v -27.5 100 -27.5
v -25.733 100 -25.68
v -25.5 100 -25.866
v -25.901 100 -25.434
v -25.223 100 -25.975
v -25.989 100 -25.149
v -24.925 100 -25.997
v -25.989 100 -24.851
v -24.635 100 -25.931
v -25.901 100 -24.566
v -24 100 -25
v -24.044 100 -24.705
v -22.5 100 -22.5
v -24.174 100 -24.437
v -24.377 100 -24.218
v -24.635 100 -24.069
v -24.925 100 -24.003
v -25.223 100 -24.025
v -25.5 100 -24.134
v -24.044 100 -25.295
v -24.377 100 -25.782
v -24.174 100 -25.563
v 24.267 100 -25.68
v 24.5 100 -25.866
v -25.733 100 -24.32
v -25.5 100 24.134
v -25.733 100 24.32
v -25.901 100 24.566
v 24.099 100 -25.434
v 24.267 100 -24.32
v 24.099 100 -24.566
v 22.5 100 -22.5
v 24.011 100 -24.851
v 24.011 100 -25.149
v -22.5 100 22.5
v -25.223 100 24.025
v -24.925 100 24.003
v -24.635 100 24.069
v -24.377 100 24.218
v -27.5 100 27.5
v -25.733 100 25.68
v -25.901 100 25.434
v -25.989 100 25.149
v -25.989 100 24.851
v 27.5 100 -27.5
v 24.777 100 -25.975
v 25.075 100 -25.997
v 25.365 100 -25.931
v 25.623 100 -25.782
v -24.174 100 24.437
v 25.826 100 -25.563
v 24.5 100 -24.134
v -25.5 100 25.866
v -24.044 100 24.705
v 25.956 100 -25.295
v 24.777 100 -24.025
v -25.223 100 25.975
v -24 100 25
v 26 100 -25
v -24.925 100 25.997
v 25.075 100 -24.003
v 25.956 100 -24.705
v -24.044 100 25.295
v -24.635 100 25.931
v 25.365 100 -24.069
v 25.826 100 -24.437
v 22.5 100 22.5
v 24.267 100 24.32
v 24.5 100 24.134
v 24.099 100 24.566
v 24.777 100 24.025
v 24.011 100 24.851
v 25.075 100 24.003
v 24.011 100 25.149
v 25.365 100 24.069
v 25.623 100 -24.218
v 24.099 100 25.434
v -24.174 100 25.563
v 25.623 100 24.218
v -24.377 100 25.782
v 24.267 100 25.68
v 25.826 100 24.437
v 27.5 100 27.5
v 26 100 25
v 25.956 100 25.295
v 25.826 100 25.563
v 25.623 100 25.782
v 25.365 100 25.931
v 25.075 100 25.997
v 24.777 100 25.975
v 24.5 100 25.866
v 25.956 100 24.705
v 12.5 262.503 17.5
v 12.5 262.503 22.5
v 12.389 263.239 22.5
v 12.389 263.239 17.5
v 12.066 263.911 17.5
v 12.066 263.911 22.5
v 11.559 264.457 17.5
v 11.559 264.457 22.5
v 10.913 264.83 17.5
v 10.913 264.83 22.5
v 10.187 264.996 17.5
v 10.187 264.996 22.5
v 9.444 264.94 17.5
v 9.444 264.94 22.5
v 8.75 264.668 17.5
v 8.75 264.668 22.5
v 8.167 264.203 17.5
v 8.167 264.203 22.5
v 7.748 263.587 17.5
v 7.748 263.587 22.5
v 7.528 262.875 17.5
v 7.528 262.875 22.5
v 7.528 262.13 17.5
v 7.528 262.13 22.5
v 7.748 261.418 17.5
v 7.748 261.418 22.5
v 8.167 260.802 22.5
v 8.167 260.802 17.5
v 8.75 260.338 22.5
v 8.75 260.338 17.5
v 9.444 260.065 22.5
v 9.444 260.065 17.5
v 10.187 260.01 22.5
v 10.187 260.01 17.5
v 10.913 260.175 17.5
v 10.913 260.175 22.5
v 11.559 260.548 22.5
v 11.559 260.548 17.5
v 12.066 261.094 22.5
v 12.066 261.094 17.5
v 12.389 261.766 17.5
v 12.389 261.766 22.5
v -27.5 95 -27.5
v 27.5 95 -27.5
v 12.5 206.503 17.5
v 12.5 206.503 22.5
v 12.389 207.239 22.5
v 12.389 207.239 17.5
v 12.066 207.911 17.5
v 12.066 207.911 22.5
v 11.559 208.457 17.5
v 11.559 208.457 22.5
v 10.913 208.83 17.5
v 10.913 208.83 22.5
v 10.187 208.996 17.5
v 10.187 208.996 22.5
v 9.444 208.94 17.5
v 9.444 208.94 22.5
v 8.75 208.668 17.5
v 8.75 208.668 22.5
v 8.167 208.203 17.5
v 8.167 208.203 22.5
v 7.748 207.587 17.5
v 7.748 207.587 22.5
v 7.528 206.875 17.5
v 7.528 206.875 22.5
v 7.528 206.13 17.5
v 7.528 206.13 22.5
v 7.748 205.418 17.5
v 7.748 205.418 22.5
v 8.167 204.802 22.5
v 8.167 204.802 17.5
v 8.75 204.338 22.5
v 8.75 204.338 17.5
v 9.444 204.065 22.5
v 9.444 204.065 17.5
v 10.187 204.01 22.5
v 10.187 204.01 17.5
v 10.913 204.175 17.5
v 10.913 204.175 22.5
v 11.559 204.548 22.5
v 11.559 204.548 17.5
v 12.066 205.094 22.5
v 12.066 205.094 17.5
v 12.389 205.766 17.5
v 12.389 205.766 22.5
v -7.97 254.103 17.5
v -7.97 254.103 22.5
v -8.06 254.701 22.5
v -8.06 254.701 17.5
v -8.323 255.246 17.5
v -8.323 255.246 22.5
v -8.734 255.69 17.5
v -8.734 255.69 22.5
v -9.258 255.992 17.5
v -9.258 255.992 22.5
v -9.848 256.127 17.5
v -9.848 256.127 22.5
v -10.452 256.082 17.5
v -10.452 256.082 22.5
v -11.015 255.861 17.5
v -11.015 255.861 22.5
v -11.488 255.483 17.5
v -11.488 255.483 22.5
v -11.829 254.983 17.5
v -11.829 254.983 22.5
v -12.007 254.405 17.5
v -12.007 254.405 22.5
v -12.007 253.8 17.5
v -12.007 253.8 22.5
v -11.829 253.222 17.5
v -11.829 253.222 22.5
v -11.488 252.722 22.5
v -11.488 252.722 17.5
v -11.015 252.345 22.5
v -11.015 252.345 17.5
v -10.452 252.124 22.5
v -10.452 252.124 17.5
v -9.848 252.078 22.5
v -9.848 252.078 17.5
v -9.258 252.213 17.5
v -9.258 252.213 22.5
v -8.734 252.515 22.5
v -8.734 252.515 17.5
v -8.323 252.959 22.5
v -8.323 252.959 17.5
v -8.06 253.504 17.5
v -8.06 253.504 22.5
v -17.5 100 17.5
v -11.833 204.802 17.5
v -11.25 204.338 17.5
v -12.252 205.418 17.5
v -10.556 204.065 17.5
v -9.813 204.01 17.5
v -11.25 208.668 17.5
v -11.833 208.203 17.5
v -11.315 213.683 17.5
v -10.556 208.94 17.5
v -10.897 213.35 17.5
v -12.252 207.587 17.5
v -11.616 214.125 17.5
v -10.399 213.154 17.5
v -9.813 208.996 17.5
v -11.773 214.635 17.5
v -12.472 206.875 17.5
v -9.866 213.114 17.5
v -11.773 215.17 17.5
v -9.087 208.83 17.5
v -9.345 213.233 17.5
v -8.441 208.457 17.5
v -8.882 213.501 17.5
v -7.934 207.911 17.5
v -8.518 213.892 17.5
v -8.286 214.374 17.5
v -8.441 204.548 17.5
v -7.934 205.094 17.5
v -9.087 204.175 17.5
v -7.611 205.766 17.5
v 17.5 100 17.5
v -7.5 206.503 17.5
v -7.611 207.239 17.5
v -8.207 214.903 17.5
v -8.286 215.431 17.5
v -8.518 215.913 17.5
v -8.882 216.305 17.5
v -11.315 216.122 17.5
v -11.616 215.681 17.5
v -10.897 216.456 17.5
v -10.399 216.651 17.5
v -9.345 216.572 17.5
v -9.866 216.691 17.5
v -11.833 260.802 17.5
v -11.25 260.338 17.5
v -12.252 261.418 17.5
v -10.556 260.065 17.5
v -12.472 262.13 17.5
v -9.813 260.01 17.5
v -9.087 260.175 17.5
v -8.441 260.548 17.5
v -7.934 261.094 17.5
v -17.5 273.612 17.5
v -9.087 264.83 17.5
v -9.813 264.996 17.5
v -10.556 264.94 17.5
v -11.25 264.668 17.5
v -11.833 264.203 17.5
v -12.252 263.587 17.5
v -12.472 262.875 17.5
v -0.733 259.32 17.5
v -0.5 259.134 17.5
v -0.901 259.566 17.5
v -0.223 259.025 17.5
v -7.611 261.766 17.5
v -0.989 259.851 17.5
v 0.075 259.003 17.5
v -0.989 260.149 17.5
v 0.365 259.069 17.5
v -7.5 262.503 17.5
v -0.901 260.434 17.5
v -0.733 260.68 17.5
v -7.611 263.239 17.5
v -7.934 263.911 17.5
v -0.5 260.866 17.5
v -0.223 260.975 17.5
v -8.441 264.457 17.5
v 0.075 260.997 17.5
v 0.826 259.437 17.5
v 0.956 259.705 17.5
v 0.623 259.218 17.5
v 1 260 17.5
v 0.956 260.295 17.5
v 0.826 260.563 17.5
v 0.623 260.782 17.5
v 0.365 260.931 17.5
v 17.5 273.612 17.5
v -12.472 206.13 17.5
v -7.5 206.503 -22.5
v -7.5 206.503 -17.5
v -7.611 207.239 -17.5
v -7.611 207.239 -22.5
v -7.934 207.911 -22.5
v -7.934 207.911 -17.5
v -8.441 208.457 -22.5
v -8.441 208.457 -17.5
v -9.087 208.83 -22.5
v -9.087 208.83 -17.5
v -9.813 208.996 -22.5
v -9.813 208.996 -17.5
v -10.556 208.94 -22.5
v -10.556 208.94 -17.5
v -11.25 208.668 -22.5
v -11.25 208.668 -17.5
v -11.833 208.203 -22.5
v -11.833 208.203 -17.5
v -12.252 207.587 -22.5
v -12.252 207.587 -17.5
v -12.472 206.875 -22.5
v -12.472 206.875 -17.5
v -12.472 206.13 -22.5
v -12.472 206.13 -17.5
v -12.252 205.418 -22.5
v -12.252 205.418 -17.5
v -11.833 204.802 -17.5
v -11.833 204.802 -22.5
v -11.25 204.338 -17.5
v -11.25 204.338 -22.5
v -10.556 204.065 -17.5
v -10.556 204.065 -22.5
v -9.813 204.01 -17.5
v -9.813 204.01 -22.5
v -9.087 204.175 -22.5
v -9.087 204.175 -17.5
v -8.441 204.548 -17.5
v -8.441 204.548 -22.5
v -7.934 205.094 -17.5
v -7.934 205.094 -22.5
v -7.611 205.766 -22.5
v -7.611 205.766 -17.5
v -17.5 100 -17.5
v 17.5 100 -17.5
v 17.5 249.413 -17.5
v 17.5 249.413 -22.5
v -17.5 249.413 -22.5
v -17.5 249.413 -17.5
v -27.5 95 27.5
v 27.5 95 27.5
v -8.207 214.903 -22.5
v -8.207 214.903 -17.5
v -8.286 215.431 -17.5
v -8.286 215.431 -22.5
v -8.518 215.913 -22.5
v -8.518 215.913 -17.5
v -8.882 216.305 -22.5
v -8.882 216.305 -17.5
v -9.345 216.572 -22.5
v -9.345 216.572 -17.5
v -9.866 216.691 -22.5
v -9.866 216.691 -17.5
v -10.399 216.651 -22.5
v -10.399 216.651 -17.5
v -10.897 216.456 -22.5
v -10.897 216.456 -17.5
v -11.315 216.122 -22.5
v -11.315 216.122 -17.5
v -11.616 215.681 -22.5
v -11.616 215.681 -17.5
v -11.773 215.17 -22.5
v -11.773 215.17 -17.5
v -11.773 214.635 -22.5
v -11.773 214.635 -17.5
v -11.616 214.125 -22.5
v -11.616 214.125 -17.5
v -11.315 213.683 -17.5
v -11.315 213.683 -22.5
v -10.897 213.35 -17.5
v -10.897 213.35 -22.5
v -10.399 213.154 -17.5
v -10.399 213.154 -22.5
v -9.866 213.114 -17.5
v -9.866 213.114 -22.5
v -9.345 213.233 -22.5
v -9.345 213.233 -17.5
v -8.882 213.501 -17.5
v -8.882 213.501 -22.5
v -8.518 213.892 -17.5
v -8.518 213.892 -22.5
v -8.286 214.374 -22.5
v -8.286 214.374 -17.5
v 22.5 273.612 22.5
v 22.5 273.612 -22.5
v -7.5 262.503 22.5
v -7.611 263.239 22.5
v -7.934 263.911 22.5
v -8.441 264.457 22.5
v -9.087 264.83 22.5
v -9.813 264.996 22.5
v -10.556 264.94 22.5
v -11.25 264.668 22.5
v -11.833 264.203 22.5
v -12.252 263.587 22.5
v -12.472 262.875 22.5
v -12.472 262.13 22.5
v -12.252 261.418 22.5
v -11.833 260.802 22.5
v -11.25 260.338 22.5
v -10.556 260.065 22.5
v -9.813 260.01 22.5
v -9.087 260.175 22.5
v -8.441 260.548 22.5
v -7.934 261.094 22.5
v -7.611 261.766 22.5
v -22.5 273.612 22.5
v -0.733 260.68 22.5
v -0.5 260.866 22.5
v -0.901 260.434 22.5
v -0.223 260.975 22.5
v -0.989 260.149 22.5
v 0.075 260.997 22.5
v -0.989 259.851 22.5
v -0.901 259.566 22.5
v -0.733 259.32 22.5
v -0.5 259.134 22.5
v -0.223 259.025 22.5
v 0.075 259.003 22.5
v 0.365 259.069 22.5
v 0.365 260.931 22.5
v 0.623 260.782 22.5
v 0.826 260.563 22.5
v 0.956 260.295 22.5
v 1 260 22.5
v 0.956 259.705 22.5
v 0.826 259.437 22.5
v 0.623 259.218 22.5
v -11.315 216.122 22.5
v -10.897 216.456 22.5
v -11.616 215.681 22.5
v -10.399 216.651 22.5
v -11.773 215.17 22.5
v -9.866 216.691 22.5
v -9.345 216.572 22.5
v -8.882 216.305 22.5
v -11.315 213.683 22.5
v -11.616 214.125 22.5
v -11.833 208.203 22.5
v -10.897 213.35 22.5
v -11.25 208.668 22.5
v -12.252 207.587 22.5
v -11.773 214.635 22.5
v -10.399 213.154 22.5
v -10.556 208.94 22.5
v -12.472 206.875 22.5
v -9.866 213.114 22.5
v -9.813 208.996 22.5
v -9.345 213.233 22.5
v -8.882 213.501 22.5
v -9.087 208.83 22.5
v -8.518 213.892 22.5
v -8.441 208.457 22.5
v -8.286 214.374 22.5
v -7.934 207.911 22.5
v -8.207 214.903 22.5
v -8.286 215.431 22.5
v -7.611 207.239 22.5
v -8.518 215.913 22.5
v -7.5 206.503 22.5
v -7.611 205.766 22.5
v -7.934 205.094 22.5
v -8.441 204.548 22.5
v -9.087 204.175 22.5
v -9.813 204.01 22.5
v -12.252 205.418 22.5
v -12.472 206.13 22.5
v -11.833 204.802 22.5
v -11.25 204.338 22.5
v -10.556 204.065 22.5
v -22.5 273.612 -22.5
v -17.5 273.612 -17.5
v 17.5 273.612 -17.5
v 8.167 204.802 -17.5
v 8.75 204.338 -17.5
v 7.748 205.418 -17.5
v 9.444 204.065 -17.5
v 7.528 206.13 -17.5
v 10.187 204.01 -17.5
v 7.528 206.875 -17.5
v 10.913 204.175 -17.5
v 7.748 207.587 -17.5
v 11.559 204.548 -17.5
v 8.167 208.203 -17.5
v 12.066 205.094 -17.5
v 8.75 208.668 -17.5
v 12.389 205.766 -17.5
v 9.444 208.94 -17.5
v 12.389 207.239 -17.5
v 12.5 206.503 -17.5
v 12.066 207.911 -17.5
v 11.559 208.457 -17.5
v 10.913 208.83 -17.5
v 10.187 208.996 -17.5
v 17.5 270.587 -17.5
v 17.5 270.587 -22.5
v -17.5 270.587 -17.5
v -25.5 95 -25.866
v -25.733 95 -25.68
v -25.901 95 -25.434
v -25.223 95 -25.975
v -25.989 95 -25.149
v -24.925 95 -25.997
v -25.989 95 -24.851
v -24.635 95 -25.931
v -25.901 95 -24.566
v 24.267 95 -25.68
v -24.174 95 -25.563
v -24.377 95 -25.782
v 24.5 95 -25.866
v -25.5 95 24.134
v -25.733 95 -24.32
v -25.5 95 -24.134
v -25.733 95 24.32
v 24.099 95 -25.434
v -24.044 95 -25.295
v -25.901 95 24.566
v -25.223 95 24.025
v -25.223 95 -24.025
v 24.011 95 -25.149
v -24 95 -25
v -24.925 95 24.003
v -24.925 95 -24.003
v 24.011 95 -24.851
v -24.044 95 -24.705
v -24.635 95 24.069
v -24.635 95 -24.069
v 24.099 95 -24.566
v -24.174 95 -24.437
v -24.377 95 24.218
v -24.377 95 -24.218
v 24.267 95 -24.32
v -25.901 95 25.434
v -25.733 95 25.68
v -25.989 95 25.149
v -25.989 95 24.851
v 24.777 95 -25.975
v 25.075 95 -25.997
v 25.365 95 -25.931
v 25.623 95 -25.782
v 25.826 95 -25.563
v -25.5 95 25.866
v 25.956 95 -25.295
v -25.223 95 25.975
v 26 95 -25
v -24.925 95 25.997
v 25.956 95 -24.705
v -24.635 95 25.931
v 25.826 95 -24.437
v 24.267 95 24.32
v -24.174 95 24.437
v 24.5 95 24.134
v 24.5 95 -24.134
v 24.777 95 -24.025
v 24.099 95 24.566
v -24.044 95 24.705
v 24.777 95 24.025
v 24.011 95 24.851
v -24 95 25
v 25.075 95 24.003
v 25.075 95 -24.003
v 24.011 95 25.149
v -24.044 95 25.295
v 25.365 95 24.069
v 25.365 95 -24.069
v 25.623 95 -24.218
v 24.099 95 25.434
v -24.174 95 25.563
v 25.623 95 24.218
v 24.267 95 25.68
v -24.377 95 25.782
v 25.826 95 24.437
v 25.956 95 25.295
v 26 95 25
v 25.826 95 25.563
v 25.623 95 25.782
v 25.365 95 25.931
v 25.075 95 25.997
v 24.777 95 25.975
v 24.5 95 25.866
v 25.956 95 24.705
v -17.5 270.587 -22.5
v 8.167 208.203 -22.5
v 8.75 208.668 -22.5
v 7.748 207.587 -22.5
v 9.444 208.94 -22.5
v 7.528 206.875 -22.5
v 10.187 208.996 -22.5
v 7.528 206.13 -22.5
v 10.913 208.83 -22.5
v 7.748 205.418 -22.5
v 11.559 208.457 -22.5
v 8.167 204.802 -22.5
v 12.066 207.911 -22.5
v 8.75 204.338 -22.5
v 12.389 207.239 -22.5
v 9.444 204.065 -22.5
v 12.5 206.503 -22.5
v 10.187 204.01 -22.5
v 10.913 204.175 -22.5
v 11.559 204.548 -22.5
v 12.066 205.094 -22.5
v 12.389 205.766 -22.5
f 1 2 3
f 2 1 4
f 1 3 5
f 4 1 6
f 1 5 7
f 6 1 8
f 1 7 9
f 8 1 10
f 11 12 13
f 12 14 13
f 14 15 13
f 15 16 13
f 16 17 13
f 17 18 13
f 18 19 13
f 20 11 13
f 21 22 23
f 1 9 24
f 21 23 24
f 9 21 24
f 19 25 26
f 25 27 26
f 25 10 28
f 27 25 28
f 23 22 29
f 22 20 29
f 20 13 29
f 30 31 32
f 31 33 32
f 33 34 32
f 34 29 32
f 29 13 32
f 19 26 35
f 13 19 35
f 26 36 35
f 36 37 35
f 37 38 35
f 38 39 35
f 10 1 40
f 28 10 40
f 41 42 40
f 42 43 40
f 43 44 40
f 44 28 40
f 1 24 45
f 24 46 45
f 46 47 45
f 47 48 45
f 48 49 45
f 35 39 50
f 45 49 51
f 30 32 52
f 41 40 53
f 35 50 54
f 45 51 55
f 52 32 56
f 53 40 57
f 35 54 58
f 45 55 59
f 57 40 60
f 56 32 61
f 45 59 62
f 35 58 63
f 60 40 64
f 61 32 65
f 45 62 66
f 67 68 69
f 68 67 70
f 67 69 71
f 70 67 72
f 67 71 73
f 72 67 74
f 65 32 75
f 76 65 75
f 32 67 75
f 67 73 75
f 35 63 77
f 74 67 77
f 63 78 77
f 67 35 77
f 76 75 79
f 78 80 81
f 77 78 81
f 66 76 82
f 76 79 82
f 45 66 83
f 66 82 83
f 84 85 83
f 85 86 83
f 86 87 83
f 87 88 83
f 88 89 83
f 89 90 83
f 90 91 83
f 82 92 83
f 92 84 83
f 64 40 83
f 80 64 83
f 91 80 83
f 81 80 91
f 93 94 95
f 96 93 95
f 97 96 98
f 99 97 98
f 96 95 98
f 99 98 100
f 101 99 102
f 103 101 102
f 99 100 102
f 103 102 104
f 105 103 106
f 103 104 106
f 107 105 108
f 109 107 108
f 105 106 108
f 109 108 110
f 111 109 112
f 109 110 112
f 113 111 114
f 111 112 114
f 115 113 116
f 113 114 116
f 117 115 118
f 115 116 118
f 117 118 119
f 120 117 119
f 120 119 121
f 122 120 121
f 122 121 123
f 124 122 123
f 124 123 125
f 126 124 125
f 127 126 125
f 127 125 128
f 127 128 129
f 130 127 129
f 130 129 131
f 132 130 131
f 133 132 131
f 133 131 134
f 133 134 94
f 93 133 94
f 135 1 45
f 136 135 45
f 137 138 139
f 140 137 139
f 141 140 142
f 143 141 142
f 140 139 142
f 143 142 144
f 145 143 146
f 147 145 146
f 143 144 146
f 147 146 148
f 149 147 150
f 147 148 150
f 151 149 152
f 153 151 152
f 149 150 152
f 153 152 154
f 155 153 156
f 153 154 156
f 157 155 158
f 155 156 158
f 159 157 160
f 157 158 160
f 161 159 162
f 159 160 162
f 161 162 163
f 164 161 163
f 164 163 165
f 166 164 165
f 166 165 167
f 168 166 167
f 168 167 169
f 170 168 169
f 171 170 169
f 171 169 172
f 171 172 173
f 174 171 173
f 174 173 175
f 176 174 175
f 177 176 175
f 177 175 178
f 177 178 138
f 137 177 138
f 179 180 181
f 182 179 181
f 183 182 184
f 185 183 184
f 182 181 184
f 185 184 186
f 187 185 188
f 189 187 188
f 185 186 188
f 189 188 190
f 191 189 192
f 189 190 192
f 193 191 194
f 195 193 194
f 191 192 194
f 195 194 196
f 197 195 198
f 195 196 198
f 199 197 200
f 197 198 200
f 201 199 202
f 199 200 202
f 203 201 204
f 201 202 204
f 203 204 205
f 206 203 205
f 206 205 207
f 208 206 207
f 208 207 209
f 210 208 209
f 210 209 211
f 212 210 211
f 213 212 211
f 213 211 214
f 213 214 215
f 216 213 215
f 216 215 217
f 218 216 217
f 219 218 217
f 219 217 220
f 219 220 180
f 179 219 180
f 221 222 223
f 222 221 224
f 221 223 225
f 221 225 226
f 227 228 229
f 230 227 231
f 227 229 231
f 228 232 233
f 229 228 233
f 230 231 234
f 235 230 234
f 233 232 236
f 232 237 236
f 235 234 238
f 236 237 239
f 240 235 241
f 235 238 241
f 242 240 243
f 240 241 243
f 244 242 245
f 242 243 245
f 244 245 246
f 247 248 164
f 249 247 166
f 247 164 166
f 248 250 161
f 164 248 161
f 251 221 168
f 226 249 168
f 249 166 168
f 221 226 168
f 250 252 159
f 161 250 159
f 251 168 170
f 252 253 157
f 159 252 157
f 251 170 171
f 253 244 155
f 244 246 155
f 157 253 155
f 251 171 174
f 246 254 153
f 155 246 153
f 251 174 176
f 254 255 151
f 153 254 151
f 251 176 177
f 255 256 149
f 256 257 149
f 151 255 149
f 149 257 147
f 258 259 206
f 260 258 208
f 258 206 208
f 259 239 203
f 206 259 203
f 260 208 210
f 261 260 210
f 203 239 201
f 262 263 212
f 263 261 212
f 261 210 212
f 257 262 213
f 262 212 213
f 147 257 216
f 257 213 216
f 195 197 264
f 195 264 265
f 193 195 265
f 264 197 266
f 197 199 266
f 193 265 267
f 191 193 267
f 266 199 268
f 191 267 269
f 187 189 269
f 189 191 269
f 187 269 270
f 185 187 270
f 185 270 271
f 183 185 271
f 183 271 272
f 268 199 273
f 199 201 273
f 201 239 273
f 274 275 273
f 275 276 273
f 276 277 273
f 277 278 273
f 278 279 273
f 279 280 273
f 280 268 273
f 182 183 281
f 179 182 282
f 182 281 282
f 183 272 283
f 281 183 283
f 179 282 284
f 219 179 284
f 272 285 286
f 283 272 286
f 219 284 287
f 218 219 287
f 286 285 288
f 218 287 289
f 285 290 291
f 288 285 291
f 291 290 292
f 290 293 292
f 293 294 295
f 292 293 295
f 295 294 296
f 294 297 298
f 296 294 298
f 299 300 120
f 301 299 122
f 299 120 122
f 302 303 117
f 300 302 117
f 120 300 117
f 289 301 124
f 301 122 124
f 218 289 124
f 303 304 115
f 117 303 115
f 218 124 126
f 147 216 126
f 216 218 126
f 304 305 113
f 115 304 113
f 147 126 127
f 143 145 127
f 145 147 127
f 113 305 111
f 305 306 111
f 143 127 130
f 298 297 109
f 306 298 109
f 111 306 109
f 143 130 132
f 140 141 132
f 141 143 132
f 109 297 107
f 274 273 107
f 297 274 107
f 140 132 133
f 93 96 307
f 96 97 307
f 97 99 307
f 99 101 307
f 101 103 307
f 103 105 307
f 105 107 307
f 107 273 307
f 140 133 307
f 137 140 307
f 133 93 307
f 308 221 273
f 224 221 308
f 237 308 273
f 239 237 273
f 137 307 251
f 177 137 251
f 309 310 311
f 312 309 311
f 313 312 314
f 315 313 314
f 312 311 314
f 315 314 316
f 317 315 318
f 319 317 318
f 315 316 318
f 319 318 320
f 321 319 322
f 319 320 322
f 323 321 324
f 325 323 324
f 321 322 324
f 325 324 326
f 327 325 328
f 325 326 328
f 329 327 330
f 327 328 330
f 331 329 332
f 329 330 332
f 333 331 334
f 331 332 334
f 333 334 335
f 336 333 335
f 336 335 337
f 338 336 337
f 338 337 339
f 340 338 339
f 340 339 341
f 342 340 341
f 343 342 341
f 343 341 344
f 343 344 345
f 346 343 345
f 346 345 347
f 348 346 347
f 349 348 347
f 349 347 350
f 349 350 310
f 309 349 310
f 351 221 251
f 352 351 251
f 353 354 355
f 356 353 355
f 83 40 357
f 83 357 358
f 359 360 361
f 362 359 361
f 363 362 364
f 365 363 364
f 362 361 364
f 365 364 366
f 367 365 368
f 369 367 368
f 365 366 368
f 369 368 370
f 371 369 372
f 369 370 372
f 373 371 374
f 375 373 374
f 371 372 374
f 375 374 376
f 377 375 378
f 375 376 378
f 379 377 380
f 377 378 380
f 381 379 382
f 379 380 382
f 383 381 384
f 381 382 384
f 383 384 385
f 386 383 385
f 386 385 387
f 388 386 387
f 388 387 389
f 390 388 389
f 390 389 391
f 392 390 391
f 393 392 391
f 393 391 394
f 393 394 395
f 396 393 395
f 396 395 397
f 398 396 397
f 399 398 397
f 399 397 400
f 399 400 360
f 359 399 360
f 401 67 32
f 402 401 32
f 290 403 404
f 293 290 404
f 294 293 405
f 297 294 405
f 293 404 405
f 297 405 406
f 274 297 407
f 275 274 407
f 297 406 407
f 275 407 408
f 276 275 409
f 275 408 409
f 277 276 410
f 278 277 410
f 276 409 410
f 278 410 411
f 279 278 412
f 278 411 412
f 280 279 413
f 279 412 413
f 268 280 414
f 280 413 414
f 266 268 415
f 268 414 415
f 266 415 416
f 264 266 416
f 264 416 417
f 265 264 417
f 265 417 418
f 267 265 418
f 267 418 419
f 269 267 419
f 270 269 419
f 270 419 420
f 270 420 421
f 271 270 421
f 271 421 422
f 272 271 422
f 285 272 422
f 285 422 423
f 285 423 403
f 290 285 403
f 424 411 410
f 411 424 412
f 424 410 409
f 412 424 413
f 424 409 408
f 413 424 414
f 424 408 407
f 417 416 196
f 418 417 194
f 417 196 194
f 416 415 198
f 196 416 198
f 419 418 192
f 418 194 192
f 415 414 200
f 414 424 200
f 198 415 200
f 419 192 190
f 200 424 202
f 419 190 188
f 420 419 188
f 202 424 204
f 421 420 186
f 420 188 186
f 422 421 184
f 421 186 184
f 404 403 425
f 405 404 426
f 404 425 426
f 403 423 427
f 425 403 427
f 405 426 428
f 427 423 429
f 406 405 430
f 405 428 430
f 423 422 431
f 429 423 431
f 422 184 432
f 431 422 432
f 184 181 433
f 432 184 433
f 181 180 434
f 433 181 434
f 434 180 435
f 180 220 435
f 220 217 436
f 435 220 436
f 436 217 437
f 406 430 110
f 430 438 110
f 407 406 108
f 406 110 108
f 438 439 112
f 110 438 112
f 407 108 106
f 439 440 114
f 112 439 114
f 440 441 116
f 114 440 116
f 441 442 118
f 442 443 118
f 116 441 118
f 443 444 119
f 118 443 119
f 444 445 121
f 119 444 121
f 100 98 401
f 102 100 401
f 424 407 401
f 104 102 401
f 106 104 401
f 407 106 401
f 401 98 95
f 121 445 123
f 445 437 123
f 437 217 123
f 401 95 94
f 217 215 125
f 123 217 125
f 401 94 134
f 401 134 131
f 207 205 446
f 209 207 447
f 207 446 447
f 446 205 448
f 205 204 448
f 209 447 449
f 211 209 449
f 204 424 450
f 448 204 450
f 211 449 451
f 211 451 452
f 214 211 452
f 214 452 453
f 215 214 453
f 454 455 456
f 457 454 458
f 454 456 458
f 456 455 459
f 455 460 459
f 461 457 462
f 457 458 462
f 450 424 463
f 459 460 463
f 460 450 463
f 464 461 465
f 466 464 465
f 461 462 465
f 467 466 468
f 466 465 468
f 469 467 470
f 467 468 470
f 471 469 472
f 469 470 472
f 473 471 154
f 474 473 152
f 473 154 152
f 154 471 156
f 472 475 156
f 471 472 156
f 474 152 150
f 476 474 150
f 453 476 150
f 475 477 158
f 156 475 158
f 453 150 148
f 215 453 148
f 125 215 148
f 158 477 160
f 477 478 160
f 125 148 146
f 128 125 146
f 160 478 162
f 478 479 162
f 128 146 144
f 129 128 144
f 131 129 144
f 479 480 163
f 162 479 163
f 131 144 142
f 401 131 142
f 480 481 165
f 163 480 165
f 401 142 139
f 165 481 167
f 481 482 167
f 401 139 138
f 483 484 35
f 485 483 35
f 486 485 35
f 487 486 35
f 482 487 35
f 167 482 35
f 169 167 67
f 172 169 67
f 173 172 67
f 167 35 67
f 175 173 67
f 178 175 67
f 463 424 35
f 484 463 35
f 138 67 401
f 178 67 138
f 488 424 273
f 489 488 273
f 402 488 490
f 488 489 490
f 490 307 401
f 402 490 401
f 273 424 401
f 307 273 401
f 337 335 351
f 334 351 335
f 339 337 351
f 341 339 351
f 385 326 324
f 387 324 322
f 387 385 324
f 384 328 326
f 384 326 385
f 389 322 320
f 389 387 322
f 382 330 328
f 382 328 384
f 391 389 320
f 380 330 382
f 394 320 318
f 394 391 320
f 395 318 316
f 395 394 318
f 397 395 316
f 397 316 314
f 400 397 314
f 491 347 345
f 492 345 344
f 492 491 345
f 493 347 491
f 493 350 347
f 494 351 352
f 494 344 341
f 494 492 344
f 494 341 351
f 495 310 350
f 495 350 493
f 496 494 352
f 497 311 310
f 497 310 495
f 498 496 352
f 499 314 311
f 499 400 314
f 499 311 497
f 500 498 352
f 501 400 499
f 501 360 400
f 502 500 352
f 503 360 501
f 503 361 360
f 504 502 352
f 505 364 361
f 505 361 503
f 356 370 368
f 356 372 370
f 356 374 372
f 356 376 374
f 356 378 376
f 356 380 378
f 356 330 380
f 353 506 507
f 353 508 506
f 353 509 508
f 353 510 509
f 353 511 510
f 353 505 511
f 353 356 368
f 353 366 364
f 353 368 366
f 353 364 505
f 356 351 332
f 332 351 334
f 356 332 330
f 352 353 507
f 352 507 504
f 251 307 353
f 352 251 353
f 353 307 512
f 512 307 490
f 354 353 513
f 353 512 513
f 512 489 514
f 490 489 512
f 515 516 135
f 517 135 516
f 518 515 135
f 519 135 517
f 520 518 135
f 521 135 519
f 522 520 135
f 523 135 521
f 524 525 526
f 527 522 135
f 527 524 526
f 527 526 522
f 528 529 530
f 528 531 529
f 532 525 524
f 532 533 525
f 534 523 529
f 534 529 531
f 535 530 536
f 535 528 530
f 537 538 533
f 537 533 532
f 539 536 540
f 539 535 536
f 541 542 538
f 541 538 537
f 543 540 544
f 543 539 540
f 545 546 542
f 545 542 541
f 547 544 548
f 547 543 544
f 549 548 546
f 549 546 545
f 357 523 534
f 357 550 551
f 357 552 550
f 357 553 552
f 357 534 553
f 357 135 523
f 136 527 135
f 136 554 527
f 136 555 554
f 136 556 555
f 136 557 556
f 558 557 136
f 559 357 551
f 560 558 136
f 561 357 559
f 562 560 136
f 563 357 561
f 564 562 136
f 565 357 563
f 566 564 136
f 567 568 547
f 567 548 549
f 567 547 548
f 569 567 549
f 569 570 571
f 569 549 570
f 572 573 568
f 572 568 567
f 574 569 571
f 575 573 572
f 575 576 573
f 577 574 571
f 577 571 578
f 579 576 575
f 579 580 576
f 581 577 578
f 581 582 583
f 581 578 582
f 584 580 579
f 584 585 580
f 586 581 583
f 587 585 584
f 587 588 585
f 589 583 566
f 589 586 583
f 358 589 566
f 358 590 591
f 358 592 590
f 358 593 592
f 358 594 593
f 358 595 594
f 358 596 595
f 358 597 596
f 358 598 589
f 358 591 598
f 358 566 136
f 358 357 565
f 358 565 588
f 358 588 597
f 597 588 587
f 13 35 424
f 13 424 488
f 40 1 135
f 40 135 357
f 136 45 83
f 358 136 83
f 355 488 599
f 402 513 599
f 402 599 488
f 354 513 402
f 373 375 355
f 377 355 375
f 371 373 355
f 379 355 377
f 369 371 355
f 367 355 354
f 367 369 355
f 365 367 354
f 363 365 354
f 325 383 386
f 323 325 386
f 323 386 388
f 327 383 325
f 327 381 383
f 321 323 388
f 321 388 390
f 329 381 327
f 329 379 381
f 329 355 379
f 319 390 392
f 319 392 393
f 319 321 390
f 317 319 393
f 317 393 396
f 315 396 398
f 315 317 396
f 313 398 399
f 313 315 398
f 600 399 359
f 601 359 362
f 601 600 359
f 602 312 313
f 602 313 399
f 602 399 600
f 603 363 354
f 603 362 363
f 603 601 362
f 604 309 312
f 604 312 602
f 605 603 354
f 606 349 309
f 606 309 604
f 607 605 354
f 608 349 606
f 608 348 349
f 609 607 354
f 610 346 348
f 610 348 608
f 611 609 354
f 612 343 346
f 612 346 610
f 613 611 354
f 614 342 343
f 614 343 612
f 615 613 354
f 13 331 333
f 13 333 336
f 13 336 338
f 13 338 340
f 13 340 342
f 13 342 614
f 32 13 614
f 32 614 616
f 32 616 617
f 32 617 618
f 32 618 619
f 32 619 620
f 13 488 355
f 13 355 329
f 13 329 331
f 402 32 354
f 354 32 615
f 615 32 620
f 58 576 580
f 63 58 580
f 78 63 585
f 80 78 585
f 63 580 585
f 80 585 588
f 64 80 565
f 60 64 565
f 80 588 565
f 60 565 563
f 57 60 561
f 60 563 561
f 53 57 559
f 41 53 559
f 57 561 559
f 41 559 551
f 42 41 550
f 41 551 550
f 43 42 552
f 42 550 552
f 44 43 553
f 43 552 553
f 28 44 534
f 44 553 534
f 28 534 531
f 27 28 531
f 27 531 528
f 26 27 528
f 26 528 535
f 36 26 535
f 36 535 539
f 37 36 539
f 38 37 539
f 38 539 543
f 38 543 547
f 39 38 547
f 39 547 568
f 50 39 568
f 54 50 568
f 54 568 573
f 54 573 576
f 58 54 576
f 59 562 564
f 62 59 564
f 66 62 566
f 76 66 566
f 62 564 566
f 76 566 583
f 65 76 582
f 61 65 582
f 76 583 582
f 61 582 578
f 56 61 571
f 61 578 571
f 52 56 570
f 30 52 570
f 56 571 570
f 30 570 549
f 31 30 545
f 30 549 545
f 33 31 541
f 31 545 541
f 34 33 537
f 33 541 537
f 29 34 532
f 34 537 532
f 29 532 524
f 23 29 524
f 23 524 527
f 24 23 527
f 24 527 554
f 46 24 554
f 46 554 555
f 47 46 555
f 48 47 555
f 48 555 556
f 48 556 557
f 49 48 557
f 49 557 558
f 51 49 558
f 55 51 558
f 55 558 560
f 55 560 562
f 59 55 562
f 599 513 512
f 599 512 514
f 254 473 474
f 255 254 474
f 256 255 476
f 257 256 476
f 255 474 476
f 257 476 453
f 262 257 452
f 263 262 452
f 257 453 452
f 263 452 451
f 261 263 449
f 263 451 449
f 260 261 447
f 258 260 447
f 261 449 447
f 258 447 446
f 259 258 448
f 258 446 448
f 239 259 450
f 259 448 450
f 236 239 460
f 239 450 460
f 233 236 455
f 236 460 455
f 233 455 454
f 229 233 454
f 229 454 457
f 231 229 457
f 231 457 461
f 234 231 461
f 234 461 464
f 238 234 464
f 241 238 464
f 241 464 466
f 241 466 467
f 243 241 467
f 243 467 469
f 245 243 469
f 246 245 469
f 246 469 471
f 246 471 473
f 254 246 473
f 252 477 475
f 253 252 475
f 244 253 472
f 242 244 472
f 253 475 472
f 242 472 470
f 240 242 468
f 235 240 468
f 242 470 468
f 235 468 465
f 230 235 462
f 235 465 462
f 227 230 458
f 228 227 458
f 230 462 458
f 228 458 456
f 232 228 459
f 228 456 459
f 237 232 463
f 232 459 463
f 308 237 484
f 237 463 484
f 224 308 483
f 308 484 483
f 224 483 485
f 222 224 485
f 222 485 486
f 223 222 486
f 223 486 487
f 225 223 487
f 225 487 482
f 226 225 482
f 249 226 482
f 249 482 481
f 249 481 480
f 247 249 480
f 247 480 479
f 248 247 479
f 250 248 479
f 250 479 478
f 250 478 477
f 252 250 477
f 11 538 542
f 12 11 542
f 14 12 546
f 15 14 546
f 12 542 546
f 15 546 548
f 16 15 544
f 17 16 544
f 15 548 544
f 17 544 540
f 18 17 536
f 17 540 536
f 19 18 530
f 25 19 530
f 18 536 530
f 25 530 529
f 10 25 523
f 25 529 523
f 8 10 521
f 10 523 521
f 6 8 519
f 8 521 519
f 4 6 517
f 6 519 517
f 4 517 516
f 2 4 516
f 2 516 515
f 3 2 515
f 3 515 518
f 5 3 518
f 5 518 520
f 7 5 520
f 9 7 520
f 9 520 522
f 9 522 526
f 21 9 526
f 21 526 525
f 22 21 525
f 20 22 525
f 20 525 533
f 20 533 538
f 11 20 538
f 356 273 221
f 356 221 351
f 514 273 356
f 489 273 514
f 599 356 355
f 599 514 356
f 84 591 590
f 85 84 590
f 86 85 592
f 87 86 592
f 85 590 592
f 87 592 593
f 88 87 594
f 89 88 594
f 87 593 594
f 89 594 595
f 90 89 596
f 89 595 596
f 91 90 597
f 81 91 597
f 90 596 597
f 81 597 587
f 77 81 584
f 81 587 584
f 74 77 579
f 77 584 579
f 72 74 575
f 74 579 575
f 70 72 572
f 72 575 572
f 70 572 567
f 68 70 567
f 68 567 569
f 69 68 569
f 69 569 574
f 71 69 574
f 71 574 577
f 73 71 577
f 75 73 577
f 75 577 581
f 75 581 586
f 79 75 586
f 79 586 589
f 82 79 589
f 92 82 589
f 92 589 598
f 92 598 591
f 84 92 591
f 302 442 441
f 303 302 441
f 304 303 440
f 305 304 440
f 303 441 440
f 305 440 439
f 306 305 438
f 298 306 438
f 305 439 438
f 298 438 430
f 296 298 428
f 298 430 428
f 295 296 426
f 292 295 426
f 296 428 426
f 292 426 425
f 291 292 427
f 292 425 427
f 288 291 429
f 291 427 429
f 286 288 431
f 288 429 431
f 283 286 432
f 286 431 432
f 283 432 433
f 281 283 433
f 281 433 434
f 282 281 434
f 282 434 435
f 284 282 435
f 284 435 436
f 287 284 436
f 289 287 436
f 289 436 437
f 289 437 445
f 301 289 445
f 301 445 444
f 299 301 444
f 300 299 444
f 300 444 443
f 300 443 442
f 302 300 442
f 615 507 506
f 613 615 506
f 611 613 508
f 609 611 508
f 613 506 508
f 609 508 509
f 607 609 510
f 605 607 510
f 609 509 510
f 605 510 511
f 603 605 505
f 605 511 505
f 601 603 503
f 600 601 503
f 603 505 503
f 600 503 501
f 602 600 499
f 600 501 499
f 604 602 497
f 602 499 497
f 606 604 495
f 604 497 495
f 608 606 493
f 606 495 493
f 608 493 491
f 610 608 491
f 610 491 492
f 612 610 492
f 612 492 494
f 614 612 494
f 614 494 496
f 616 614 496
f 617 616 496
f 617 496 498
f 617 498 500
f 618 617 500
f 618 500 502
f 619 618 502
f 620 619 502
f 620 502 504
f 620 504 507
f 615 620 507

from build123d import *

# Parameters (mm, degrees)
CROQUIS1_W                 = 45
CROQUIS1_H                 = 45
SALIENTE_EXTRUIR1_DEPTH    = 300
CROQUIS4_W                 = 18
CROQUIS4_H                 = 34
CORTAR_EXTRUIR2_DEPTH      = 46
CROQUIS8_W                 = 35
CROQUIS8_H                 = 35
CORTAR_EXTRUIR3_DEPTH      = 301
CROQUIS9_W                 = 35
CROQUIS9_H                 = 21.174410022
CORTAR_EXTRUIR4_DEPTH      = 10
CROQUIS10_R                = 1
CORTAR_EXTRUIR5_DEPTH      = 10
CROQUIS11_W                = 45
CROQUIS11_H                = 26.387879272
CORTAR_EXTRUIR6_DEPTH      = 46
CROQUIS13_W                = 45
CROQUIS13_H                = 100
CORTAR_EXTRUIR7_DEPTH      = 23.5
CORTAR_EXTRUIR7_DEPTH_BACK = 23.5
CROQUIS14_W                = 55
CROQUIS14_H                = 55
SALIENTE_EXTRUIR2_DEPTH    = 5
CROQUIS16_R                = 1
CORTAR_EXTRUIR8_DEPTH      = 1
CORTAR_EXTRUIR8_DEPTH_BACK = 179.612120728
CROQUIS17_R                = 2.5
CROQUIS17_R_2              = 2.03
CROQUIS17_R_3              = 1.793308219
CORTAR_EXTRUIR9_DEPTH      = 6
CORTAR_EXTRUIR9_DEPTH_BACK = 51


with BuildPart() as part:
    # Croquis1 → Saliente-Extruir1 (new body)
    with BuildSketch(Plane(origin=(0, 0, 0), x_dir=(1, 0, 0), z_dir=(0, 1, 0))):
        Rectangle(CROQUIS1_W, CROQUIS1_H)
    extrude(amount=SALIENTE_EXTRUIR1_DEPTH)

    # Croquis4 → Cortar-Extruir2 (cut, through all)
    with BuildSketch(Plane.ZY.offset(22.5)):
        with Locations((13.5, 17)):
            Rectangle(CROQUIS4_W, CROQUIS4_H)
    extrude(amount=-CORTAR_EXTRUIR2_DEPTH, mode=Mode.SUBTRACT)

    # Croquis8 → Cortar-Extruir3 (cut, through all)
    with BuildSketch(Plane(origin=(0, 300, 0), x_dir=(1, 0, 0), z_dir=(0, 1, 0))):
        Rectangle(CROQUIS8_W, CROQUIS8_H)
    extrude(amount=-CORTAR_EXTRUIR3_DEPTH, mode=Mode.SUBTRACT)

    # Croquis9 → Cortar-Extruir4 (cut)
    with BuildSketch(Plane(origin=(0, 0, -22.5), x_dir=(-1, 0, 0), z_dir=(0, 0, -1))):
        with Locations((0, 260)):
            Rectangle(CROQUIS9_W, CROQUIS9_H)
    extrude(amount=-CORTAR_EXTRUIR4_DEPTH, mode=Mode.SUBTRACT)

    # Croquis10 → Cortar-Extruir5 (cut)
    with BuildSketch(Plane.XY.offset(22.5)):
        with Locations((0, 260)):
            Circle(CROQUIS10_R)
    extrude(amount=-CORTAR_EXTRUIR5_DEPTH, mode=Mode.SUBTRACT)

    # Croquis11 → Cortar-Extruir6 (cut, through all)
    with BuildSketch(Plane.XY.offset(22.5)):
        with Locations((0, 286.806060364)):
            Rectangle(CROQUIS11_W, CROQUIS11_H)
    extrude(amount=-CORTAR_EXTRUIR6_DEPTH, mode=Mode.SUBTRACT)

    # Croquis13 → Cortar-Extruir7 (cut, two sides)
    with BuildSketch(Plane(origin=(0, 0, 0), x_dir=(0, 0, -1), z_dir=(1, 0, 0))) as cortar_extruir7_sk:
        with Locations((0, 50)):
            Rectangle(CROQUIS13_W, CROQUIS13_H)
    extrude(amount=CORTAR_EXTRUIR7_DEPTH, mode=Mode.SUBTRACT)
    extrude(cortar_extruir7_sk.sketch, amount=-CORTAR_EXTRUIR7_DEPTH_BACK, mode=Mode.SUBTRACT)

    # Croquis14 → Saliente-Extruir2 (add)
    with BuildSketch(Plane.XZ.offset(-100)):
        Rectangle(CROQUIS14_W, CROQUIS14_H)
    extrude(amount=SALIENTE_EXTRUIR2_DEPTH)

    # Croquis16 → Cortar-Extruir8 (cut, two sides)
    with BuildSketch(Plane.XZ.offset(-95)) as cortar_extruir8_sk:
        with Locations((25, 25)):
            Circle(CROQUIS16_R)
        with Locations((-25, 25)):
            Circle(CROQUIS16_R)
        with Locations((-25, -25)):
            Circle(CROQUIS16_R)
        with Locations((25, -25)):
            Circle(CROQUIS16_R)
    extrude(amount=CORTAR_EXTRUIR8_DEPTH, mode=Mode.SUBTRACT)
    extrude(cortar_extruir8_sk.sketch, amount=-CORTAR_EXTRUIR8_DEPTH_BACK, mode=Mode.SUBTRACT)

    # Croquis17 → Cortar-Extruir9 (cut, two sides)
    with BuildSketch(Plane.XY.offset(22.5)) as cortar_extruir9_sk:
        with Locations((-10, 262.50260741)):
            Circle(CROQUIS17_R)
        with Locations((-10, 254.10260741)):
            Circle(CROQUIS17_R_2)
        with Locations((-10, 214.90260741)):
            Circle(CROQUIS17_R_3)
        with Locations((-10, 206.50260741)):
            Circle(CROQUIS17_R)
        with Locations((10, 262.50260741)):
            Circle(CROQUIS17_R)
        with Locations((10, 206.50260741)):
            Circle(CROQUIS17_R)
    extrude(amount=CORTAR_EXTRUIR9_DEPTH, mode=Mode.SUBTRACT)
    extrude(cortar_extruir9_sk.sketch, amount=-CORTAR_EXTRUIR9_DEPTH_BACK, mode=Mode.SUBTRACT)


solid = part.part
